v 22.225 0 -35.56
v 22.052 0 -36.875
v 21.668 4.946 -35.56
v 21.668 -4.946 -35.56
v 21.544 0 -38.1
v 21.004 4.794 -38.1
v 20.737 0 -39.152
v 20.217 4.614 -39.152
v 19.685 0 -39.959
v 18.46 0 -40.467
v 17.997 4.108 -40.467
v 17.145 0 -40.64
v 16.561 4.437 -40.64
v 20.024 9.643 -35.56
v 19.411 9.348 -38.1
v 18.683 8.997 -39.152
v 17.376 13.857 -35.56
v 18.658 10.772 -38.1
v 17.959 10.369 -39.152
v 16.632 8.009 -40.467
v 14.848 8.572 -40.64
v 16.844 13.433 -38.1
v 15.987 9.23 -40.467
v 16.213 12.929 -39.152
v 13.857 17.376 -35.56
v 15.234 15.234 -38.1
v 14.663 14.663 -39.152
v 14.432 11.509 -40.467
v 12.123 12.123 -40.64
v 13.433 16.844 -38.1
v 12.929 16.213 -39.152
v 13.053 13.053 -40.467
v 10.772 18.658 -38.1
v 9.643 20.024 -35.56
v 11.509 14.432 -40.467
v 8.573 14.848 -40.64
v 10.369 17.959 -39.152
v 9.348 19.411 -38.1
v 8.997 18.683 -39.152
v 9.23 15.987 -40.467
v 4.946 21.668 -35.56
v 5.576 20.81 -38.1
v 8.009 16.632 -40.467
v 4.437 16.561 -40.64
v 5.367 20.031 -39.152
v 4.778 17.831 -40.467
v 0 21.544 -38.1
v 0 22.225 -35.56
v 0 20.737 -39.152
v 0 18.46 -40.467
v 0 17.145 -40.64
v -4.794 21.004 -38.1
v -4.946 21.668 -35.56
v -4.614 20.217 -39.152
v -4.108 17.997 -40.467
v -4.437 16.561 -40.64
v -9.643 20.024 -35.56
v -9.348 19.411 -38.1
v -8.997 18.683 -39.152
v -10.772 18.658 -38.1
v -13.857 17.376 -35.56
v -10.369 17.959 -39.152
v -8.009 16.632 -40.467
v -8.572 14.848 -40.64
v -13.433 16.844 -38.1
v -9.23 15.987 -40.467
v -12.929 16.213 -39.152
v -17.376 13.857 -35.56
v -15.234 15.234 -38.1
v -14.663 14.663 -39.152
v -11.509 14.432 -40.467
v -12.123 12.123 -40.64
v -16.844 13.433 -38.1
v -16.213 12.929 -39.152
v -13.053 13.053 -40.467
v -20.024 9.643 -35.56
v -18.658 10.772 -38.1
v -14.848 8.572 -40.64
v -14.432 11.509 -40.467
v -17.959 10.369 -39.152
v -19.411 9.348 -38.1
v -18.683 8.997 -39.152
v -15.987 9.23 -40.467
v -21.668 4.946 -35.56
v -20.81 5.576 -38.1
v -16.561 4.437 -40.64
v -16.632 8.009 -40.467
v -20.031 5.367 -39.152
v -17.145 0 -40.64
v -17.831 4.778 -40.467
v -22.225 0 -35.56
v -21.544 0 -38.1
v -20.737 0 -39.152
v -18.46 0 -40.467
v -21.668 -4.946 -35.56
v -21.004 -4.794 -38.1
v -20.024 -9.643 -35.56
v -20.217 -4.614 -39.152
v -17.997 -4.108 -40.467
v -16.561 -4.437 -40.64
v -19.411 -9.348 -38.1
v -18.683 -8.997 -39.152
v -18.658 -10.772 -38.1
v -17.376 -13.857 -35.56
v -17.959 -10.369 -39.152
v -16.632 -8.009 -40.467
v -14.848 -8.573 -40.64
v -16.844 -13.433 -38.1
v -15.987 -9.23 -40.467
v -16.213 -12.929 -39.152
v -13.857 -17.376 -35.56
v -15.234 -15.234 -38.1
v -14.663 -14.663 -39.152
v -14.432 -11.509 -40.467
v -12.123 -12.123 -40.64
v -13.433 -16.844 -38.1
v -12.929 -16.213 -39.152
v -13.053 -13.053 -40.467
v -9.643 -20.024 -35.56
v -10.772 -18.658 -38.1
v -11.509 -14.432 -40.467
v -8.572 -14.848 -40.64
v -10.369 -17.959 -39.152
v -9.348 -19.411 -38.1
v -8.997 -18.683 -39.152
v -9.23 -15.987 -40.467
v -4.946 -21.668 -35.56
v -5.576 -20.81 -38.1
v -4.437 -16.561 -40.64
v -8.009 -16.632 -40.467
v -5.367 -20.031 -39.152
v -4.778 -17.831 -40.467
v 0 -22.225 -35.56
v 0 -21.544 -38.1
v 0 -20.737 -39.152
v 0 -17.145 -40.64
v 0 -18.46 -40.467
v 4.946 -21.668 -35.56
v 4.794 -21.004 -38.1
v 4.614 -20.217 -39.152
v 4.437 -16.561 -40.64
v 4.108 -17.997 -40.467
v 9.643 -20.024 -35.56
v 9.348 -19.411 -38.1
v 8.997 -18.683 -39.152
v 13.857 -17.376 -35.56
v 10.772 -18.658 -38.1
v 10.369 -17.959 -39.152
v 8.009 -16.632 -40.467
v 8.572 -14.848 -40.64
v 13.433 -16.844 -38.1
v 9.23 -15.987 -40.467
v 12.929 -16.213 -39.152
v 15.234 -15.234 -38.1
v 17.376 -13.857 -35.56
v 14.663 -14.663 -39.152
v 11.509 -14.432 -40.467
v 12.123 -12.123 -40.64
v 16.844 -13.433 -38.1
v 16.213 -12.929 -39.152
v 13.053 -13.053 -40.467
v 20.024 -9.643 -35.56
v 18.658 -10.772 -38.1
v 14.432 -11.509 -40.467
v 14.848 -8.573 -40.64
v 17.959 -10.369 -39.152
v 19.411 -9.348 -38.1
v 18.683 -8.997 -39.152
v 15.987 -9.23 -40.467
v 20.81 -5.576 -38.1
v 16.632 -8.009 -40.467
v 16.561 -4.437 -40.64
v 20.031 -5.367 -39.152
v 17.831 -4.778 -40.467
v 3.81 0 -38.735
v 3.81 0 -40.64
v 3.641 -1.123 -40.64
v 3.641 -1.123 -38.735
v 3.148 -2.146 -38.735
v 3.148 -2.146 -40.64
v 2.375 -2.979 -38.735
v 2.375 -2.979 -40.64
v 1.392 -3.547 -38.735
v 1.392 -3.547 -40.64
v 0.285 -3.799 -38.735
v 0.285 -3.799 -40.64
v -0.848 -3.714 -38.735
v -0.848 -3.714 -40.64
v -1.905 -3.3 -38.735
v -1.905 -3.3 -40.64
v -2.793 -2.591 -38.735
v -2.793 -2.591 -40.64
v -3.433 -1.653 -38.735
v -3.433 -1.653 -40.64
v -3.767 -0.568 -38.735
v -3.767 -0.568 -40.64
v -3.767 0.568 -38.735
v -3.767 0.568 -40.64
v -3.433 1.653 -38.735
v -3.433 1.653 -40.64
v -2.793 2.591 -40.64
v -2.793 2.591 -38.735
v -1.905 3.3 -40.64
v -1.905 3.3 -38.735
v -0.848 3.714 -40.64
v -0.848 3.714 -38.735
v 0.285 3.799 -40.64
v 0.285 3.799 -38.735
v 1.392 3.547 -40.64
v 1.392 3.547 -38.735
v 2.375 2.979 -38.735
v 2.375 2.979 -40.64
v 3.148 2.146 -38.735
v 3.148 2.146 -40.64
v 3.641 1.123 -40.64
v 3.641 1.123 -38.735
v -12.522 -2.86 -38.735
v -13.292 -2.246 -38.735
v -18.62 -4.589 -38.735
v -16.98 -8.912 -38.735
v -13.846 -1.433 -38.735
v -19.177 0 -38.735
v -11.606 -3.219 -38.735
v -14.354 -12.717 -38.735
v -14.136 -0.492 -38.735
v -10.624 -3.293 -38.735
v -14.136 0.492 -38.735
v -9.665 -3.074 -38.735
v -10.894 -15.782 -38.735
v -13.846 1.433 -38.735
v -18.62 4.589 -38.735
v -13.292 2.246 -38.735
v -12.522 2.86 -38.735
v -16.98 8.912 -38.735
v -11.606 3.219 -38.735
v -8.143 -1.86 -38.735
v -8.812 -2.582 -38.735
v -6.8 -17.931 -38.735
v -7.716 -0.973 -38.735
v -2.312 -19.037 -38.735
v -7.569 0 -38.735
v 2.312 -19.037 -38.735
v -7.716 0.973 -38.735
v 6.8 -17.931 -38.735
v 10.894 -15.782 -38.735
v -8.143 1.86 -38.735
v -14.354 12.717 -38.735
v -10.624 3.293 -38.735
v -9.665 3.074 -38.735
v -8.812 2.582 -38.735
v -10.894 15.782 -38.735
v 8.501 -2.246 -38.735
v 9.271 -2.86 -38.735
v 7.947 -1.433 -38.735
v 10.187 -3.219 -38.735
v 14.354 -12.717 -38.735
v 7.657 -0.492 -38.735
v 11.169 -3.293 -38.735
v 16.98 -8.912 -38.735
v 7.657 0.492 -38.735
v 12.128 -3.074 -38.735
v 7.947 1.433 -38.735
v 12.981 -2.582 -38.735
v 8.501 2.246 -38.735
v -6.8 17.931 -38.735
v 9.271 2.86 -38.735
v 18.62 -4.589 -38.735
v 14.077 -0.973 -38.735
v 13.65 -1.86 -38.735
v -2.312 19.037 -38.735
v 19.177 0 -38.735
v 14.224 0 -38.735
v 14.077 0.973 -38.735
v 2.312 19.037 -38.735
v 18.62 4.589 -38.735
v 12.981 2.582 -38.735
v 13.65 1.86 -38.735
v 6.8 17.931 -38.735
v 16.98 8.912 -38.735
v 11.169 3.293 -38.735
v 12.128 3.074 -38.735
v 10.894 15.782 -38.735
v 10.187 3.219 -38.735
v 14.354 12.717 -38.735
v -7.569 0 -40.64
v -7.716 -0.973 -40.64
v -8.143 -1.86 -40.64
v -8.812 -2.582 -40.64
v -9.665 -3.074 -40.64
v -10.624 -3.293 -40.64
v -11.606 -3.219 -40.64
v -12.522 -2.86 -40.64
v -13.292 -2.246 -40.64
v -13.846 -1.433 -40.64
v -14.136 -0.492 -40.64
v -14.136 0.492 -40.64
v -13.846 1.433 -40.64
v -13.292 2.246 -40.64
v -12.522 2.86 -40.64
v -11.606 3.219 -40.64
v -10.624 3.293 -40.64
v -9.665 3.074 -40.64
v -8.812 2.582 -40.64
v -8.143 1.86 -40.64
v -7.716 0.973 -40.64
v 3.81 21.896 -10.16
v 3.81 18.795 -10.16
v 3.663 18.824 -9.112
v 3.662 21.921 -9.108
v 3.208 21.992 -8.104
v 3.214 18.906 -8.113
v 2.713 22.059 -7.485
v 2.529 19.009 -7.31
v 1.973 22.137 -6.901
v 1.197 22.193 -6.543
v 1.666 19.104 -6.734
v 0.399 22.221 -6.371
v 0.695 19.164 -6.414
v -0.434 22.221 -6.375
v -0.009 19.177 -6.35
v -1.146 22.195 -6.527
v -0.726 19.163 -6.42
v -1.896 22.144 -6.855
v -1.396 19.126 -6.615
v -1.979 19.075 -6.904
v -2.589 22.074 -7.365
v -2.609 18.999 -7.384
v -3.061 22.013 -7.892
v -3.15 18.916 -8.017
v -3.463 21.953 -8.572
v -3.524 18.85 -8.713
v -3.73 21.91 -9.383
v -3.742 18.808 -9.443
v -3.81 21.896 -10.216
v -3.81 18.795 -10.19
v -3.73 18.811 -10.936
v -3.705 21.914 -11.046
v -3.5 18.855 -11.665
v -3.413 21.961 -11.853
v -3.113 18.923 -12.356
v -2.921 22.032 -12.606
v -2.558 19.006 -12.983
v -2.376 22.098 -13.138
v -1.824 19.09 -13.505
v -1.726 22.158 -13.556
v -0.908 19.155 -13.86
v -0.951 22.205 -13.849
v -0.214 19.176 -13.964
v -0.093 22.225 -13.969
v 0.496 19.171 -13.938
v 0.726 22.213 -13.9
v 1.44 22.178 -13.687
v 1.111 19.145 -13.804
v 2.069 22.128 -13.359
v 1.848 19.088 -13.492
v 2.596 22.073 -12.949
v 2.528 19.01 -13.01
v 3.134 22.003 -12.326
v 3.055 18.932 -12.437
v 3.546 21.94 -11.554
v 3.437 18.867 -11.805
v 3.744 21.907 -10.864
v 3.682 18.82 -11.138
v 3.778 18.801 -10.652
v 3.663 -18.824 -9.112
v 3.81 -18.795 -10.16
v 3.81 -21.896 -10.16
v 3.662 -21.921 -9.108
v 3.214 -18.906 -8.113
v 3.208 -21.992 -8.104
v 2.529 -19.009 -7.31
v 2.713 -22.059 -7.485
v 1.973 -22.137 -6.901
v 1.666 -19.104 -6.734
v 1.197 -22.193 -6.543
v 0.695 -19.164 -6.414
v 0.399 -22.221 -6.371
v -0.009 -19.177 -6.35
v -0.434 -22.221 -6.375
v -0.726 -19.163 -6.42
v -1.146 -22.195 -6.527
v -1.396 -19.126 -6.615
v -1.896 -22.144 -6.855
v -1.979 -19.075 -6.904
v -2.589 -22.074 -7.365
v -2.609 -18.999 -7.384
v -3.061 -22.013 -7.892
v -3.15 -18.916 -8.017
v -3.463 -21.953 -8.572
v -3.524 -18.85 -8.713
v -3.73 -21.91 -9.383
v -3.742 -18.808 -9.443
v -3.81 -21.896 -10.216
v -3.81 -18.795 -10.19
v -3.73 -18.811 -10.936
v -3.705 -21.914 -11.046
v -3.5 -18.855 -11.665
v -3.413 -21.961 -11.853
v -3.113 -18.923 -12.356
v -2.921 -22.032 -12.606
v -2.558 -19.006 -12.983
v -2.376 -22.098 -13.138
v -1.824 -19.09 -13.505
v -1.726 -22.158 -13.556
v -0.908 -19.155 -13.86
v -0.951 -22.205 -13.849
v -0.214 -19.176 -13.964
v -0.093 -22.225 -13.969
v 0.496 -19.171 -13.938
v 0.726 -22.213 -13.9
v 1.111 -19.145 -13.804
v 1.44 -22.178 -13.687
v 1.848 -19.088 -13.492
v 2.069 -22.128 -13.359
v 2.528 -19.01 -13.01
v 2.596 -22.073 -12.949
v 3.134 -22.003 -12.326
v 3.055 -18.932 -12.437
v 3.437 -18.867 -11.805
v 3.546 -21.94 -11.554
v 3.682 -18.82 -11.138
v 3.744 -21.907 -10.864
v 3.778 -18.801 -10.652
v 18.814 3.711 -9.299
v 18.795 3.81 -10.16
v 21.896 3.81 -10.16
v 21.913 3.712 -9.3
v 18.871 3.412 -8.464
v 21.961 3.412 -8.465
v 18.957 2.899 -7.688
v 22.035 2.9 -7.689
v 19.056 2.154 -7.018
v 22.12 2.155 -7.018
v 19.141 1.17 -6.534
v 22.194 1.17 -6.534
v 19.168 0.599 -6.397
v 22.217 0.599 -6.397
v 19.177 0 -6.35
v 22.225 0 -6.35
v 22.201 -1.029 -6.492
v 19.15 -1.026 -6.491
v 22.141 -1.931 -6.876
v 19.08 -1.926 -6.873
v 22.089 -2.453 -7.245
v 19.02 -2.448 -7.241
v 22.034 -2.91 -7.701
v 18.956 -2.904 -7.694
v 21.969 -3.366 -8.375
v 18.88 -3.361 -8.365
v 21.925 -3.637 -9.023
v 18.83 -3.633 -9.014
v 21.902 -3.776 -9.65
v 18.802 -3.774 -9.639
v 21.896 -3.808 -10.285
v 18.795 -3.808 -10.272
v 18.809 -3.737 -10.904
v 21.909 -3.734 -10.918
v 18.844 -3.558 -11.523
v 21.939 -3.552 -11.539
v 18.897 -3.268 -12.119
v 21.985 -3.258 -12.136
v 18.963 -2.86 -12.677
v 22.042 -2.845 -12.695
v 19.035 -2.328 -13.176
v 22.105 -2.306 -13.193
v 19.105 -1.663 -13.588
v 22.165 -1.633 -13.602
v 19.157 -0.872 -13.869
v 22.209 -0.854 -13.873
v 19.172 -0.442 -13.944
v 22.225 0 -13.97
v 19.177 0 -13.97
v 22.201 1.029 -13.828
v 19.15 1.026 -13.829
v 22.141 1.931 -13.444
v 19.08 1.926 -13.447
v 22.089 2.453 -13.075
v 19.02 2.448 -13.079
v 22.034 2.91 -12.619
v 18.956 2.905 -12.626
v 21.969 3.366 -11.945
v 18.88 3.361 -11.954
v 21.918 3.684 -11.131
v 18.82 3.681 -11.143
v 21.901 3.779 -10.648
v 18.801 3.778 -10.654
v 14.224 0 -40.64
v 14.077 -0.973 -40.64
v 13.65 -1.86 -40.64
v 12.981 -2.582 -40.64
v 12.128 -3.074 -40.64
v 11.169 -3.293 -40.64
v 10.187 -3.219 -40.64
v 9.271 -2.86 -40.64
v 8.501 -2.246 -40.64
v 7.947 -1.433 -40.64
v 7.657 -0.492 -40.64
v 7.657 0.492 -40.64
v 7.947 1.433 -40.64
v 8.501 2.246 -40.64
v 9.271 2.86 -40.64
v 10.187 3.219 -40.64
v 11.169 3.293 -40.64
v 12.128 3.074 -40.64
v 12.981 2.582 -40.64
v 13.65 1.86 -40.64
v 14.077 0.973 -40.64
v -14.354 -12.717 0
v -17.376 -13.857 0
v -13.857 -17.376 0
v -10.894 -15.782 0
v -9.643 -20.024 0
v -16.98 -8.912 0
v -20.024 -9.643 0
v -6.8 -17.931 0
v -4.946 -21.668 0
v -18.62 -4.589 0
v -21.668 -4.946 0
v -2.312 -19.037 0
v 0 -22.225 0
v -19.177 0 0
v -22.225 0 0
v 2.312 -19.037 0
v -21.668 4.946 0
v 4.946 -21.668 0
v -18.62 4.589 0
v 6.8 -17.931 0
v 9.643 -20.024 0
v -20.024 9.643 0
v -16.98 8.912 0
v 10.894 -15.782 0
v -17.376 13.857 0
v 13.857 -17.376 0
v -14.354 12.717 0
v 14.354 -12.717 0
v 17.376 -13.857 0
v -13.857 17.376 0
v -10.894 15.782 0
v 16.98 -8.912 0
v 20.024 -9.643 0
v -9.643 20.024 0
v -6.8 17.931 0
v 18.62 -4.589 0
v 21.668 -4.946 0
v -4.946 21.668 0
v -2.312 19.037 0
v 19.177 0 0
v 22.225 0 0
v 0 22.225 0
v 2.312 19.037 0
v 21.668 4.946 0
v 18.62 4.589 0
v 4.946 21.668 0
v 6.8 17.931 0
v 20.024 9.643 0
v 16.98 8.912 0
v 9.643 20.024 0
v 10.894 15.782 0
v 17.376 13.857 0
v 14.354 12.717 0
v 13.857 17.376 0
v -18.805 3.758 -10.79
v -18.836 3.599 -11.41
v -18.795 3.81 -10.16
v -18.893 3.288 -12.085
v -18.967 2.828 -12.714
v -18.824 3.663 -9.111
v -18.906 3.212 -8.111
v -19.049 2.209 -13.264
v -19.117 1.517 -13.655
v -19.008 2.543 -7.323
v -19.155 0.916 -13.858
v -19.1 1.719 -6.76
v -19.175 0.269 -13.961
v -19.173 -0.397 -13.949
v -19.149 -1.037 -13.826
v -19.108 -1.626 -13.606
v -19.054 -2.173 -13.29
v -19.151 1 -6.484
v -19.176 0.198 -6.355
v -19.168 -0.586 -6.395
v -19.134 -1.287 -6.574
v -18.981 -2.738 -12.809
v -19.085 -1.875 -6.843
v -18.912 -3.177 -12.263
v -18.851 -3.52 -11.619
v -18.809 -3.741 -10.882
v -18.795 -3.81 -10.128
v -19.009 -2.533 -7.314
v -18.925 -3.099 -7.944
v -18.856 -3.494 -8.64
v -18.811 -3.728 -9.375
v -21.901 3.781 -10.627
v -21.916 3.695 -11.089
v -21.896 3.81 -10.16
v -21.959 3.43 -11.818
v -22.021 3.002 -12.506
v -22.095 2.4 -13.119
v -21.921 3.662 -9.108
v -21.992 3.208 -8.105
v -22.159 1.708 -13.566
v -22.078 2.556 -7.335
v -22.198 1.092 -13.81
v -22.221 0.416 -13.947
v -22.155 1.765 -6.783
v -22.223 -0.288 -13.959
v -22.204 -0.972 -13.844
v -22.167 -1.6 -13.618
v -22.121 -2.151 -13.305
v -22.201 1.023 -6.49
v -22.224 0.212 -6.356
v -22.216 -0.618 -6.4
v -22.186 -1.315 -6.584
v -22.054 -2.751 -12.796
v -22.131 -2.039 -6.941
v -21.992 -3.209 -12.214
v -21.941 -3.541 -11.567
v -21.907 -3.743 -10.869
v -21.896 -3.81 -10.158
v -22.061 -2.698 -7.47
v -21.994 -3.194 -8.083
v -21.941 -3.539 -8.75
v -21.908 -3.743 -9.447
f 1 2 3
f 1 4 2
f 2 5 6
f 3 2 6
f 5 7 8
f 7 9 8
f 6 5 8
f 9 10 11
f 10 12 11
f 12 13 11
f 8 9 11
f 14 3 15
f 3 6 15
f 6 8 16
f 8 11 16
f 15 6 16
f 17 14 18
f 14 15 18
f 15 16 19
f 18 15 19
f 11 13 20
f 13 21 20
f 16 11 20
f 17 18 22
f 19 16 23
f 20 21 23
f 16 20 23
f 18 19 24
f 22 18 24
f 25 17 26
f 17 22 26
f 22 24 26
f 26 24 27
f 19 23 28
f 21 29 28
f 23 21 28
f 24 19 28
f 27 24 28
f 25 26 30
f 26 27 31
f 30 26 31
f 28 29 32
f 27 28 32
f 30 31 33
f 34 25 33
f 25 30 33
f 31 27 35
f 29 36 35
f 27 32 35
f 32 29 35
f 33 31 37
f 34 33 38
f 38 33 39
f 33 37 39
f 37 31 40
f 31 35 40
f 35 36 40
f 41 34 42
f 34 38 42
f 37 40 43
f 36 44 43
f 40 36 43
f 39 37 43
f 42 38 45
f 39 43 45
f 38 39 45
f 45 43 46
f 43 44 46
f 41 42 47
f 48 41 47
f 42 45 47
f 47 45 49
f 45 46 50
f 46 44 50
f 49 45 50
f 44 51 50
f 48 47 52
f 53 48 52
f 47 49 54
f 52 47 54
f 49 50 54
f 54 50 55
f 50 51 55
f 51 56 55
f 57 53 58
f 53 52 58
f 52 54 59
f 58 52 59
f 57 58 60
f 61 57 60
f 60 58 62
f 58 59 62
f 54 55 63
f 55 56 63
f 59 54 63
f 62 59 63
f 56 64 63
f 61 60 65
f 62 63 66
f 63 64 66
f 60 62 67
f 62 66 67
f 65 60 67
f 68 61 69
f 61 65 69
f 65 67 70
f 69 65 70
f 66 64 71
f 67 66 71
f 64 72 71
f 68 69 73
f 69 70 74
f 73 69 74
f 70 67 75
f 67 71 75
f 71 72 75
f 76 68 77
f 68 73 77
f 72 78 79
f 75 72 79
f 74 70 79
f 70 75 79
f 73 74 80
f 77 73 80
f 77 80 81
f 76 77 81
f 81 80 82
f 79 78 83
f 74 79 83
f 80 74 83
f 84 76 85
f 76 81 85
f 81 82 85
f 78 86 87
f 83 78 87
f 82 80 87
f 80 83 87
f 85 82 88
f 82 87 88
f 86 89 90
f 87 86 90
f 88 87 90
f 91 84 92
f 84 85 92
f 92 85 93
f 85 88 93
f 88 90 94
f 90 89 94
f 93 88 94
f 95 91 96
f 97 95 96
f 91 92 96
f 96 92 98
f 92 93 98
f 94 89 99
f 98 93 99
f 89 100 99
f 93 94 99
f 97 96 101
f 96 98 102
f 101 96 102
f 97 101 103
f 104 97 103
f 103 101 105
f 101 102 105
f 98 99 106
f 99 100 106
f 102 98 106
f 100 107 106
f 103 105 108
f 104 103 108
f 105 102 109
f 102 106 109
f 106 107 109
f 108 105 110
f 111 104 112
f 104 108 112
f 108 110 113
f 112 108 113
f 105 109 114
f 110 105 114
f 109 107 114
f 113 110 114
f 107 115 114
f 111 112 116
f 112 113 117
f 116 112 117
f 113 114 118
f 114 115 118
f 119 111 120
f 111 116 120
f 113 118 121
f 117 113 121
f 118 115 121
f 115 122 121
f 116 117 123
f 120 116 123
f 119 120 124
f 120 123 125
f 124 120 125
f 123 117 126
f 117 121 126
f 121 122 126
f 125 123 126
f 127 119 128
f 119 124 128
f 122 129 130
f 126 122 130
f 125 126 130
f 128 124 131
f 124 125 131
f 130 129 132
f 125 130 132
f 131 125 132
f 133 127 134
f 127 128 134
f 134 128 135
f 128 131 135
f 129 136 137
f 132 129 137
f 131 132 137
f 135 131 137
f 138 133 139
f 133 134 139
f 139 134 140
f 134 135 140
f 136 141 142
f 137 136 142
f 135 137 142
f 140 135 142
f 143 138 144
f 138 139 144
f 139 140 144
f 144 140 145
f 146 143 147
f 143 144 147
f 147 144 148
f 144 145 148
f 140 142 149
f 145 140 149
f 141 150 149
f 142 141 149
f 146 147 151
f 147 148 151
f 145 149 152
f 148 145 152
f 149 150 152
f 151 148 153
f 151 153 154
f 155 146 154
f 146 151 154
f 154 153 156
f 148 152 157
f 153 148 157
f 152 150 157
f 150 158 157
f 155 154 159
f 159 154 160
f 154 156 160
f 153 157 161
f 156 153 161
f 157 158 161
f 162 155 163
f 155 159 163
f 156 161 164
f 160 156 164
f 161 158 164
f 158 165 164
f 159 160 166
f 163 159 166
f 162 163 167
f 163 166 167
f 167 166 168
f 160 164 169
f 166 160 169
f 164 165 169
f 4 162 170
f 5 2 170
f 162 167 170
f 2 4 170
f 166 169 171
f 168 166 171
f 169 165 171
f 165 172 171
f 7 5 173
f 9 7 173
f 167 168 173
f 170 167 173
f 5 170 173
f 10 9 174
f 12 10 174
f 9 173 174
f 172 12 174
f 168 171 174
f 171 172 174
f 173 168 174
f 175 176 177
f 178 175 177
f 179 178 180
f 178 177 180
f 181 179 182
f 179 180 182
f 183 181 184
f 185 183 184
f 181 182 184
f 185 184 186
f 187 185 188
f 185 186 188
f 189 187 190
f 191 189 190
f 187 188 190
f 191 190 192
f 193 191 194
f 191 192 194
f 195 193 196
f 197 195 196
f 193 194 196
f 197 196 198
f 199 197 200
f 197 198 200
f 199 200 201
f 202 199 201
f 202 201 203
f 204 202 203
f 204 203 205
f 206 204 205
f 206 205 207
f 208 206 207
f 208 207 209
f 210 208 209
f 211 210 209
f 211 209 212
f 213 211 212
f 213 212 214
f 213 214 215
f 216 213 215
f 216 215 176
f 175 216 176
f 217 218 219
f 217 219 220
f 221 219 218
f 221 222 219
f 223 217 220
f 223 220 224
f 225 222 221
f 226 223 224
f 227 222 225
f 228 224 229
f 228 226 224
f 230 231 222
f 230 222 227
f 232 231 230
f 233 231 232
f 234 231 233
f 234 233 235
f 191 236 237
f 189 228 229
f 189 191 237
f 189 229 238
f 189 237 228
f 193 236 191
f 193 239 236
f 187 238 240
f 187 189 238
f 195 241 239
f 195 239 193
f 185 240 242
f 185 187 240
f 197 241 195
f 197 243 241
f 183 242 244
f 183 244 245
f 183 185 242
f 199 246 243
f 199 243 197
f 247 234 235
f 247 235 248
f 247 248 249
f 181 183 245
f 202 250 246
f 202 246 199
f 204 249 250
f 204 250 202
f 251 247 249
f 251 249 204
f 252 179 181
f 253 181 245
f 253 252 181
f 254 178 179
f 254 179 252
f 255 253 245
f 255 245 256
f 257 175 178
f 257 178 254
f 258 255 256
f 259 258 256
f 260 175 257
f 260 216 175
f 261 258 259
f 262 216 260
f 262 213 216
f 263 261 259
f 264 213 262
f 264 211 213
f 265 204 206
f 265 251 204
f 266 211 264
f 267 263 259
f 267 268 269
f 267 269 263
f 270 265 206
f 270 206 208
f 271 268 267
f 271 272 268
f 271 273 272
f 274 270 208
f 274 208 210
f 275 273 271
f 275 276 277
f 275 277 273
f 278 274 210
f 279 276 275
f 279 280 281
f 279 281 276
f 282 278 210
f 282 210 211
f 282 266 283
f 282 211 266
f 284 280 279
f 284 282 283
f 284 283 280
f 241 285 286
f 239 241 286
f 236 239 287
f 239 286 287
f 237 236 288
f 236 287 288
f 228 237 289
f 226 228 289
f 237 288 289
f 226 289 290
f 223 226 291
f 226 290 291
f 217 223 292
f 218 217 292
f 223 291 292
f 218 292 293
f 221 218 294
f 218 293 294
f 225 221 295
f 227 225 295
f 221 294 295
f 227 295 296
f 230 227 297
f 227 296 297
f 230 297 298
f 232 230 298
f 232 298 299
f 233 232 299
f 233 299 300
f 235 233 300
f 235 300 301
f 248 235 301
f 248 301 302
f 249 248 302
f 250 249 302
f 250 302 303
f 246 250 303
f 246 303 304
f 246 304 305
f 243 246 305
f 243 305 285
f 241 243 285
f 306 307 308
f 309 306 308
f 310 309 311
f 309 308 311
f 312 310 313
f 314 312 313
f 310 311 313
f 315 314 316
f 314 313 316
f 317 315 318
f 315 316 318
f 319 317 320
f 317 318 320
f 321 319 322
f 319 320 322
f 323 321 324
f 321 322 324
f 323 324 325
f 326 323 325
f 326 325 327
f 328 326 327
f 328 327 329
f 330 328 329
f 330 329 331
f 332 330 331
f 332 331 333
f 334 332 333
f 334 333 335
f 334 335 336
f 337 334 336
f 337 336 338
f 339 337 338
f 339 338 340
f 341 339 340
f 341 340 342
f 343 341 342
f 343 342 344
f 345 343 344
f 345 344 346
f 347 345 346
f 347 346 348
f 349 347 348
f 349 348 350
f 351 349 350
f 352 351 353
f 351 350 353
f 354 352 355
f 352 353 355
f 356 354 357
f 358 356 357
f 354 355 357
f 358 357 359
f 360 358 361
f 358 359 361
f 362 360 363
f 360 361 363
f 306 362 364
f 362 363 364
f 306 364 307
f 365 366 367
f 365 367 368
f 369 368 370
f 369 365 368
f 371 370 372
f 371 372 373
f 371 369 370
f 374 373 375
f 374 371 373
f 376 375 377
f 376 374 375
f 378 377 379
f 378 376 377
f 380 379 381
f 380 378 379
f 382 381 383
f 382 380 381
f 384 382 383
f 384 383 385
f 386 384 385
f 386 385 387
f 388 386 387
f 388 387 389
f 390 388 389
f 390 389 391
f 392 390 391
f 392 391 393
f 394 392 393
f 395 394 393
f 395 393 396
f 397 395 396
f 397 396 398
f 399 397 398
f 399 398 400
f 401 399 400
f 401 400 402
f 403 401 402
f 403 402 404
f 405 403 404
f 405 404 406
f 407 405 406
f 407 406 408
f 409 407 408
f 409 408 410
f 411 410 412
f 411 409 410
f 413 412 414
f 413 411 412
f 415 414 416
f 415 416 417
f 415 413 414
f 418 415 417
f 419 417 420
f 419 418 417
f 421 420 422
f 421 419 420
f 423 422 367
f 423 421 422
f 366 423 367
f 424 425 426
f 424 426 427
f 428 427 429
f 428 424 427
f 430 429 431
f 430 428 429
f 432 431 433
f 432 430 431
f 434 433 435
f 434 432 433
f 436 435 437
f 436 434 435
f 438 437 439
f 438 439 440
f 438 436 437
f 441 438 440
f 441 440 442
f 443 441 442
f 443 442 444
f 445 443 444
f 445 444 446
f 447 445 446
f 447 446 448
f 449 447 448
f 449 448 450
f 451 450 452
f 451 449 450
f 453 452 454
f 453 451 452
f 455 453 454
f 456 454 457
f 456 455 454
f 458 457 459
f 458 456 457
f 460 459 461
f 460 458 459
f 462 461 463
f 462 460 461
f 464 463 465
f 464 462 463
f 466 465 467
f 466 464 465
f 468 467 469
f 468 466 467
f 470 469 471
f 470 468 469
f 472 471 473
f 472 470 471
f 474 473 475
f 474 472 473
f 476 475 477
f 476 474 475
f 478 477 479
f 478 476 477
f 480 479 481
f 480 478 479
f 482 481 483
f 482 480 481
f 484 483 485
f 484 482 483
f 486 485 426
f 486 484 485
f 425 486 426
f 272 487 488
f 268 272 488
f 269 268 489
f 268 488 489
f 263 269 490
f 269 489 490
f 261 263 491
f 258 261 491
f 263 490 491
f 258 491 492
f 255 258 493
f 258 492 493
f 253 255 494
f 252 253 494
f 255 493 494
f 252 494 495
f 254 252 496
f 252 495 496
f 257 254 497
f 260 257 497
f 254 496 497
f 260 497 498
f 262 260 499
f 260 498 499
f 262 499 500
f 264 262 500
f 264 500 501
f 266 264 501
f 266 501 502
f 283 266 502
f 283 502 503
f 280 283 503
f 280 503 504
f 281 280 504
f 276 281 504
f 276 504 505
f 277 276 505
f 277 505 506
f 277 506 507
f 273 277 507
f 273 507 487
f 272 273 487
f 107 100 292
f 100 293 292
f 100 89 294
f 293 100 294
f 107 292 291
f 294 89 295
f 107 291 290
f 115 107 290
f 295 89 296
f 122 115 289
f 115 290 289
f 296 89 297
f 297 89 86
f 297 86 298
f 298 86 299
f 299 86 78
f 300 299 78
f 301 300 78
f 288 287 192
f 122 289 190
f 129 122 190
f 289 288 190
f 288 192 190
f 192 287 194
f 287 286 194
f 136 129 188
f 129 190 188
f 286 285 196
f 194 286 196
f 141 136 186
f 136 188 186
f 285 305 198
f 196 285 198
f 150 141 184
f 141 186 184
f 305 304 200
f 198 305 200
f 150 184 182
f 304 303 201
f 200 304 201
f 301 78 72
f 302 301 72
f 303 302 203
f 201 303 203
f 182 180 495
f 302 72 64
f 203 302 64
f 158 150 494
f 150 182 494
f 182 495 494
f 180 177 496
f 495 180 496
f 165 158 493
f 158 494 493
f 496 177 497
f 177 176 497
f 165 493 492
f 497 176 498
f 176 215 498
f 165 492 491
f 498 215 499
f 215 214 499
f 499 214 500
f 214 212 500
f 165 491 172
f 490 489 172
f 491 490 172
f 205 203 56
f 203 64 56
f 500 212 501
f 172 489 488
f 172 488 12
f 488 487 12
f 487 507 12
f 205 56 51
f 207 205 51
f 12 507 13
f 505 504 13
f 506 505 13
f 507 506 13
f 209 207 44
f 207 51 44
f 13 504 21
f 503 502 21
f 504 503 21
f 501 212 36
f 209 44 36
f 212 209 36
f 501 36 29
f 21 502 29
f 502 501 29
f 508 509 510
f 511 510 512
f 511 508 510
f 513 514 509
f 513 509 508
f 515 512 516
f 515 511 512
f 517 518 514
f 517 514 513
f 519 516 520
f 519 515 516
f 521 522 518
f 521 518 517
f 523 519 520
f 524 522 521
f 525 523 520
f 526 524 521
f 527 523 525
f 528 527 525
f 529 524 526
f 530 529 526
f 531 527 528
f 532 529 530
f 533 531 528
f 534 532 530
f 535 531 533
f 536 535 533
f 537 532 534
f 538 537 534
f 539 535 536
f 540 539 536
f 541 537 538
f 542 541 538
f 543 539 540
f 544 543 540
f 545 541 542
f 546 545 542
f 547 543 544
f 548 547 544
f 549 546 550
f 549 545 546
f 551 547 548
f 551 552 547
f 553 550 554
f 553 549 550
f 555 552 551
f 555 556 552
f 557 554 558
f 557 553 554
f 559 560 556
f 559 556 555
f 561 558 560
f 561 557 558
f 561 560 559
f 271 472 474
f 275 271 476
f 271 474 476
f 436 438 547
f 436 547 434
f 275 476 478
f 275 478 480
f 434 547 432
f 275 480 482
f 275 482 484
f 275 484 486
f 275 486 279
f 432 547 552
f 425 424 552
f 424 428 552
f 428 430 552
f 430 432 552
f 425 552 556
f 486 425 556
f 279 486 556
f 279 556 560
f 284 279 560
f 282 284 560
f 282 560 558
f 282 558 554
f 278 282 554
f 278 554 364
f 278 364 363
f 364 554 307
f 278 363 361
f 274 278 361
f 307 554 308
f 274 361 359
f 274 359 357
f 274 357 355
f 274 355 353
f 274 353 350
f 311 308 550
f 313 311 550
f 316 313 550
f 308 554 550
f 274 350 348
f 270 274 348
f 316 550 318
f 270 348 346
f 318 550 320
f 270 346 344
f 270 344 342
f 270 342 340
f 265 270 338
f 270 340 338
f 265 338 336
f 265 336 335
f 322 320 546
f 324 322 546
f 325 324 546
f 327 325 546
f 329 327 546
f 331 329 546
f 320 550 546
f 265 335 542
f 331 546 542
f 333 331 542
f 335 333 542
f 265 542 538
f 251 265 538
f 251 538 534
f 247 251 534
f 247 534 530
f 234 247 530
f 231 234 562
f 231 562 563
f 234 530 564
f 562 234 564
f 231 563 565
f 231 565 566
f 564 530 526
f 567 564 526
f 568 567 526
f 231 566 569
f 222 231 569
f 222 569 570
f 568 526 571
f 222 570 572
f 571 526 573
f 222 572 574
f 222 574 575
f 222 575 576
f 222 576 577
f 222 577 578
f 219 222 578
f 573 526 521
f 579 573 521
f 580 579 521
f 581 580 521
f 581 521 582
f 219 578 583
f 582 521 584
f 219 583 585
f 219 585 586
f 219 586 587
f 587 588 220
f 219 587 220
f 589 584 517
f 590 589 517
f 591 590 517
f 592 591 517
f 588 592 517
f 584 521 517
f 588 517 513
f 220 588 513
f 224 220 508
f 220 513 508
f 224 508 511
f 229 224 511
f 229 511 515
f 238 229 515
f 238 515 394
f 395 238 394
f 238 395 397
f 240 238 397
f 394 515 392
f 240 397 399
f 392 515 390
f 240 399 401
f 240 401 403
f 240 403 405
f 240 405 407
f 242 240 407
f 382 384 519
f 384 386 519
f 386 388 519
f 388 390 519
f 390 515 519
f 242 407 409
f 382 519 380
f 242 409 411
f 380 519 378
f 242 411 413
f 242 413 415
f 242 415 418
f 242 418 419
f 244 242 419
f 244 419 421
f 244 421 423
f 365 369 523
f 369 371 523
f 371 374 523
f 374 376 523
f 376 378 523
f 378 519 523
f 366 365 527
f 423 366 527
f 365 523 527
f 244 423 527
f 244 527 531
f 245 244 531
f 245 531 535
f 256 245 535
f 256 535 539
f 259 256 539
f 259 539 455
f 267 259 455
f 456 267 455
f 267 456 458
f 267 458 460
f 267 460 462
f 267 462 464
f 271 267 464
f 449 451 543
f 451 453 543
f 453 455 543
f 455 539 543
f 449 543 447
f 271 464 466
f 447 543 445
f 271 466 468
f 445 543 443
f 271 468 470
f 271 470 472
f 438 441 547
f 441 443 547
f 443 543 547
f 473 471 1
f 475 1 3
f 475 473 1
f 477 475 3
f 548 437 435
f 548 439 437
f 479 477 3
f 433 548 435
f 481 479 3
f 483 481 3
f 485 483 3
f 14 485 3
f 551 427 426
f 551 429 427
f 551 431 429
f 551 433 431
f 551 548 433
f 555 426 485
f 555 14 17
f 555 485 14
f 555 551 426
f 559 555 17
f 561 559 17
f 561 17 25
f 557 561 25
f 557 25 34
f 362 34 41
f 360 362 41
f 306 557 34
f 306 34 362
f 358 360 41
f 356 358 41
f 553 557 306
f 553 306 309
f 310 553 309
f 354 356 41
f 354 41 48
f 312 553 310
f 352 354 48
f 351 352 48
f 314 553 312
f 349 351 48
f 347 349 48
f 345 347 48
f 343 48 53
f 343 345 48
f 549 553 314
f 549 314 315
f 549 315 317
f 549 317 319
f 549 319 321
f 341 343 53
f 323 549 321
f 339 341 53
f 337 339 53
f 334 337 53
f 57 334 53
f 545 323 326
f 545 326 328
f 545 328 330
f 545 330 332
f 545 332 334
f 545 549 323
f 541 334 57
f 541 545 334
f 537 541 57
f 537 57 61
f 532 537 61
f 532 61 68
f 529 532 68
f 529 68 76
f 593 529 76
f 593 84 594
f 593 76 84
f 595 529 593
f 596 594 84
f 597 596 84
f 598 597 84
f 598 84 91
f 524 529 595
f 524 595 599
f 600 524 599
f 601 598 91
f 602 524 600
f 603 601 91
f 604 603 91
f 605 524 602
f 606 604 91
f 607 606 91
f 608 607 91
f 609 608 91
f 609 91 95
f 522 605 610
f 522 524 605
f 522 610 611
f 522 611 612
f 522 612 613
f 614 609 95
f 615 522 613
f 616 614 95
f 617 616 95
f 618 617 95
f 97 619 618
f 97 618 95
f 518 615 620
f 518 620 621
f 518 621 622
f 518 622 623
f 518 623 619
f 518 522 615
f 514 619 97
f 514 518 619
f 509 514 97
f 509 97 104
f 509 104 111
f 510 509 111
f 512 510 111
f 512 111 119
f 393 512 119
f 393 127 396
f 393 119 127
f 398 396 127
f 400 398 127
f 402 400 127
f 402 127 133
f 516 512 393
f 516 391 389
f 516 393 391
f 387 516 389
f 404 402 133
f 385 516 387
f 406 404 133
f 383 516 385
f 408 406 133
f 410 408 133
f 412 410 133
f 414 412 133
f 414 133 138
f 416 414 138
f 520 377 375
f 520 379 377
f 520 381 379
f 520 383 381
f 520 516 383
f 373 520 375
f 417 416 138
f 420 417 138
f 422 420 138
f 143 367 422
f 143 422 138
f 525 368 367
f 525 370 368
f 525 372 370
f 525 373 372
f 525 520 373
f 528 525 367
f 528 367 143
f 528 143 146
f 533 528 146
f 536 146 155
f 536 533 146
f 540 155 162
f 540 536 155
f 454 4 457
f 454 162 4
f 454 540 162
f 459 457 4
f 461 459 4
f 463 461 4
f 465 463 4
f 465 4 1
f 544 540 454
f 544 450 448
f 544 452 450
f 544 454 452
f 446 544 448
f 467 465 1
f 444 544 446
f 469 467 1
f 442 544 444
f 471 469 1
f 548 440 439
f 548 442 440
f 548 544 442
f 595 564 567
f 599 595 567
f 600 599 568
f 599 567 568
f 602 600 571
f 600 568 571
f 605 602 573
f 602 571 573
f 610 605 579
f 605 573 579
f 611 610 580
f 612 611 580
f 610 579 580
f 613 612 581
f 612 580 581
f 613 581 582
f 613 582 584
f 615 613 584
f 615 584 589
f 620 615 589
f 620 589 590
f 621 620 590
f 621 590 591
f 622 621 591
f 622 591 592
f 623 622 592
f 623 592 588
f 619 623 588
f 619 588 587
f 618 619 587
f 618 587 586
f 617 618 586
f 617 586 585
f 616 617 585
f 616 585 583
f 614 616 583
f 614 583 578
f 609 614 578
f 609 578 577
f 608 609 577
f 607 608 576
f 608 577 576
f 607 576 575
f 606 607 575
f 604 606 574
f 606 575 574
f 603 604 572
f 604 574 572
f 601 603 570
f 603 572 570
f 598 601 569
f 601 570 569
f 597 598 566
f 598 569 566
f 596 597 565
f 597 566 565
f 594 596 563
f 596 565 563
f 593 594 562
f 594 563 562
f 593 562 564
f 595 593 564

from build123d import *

# Parameters (mm, degrees)
F0_R          = 22.225
F1_DEPTH      = 40.64
F2_R          = 3.81
F3_DEPTH      = 40.641
F4_R          = 3.81
F5_DEPTH      = 22.226
F5_DEPTH_BACK = 22.226
F6_R          = 3.81
F7_DEPTH      = 22.2260001
F7_DEPTH_BACK = 22.2260001
F8_R          = 3.302
F9_DEPTH      = 40.6410001
F10_R         = 19.177
F11_DEPTH     = 38.735
F12_R         = 5.08


with BuildPart() as f1:
    # F0 (on Top) → F1 (new body)
    with BuildSketch(Plane.XY):
        Circle(F0_R)
    extrude(amount=-F1_DEPTH)

    # F2 (on face) → F3 (cut, through all)
    with BuildSketch(Plane(origin=(0, 0, -40.64), x_dir=(1, 0, 0), z_dir=(0, 0, -1))):
        Circle(F2_R)
    extrude(amount=-F3_DEPTH, mode=Mode.SUBTRACT)

    # F4 (on Right) → F5 (cut, two sides)
    with BuildSketch(Plane.YZ) as f5_sk:
        with Locations((0, -10.16)):
            Circle(F4_R)
    extrude(amount=-F5_DEPTH, mode=Mode.SUBTRACT)
    extrude(f5_sk.sketch, amount=F5_DEPTH_BACK, mode=Mode.SUBTRACT)

    # F6 (on Front) → F7 (cut, two sides)
    with BuildSketch(Plane.XZ) as f7_sk:
        with Locations((0, -10.16)):
            Circle(F6_R)
    extrude(amount=-F7_DEPTH, mode=Mode.SUBTRACT)
    extrude(f7_sk.sketch, amount=F7_DEPTH_BACK, mode=Mode.SUBTRACT)

    # F8 (on face) → F9 (cut, through all)
    with BuildSketch(Plane(origin=(0, 0, -40.64), x_dir=(1, 0, 0), z_dir=(0, 0, -1))):
        with Locations((10.922, 0)):
            Circle(F8_R)
        with Locations((-10.8710342307, 0)):
            Circle(F8_R)
    extrude(amount=-F9_DEPTH, mode=Mode.SUBTRACT)

    # F10 (on face) → F11 (cut)
    with BuildSketch(Plane.XY):
        Circle(F10_R)
    extrude(amount=-F11_DEPTH, mode=Mode.SUBTRACT)

    # F12
    f12_edges = [f1.edges().sort_by_distance(p)[0] for p in [
        (-22.225, 0, -40.64),
    ]]
    fillet(f12_edges, radius=F12_R)


solid = f1.part
